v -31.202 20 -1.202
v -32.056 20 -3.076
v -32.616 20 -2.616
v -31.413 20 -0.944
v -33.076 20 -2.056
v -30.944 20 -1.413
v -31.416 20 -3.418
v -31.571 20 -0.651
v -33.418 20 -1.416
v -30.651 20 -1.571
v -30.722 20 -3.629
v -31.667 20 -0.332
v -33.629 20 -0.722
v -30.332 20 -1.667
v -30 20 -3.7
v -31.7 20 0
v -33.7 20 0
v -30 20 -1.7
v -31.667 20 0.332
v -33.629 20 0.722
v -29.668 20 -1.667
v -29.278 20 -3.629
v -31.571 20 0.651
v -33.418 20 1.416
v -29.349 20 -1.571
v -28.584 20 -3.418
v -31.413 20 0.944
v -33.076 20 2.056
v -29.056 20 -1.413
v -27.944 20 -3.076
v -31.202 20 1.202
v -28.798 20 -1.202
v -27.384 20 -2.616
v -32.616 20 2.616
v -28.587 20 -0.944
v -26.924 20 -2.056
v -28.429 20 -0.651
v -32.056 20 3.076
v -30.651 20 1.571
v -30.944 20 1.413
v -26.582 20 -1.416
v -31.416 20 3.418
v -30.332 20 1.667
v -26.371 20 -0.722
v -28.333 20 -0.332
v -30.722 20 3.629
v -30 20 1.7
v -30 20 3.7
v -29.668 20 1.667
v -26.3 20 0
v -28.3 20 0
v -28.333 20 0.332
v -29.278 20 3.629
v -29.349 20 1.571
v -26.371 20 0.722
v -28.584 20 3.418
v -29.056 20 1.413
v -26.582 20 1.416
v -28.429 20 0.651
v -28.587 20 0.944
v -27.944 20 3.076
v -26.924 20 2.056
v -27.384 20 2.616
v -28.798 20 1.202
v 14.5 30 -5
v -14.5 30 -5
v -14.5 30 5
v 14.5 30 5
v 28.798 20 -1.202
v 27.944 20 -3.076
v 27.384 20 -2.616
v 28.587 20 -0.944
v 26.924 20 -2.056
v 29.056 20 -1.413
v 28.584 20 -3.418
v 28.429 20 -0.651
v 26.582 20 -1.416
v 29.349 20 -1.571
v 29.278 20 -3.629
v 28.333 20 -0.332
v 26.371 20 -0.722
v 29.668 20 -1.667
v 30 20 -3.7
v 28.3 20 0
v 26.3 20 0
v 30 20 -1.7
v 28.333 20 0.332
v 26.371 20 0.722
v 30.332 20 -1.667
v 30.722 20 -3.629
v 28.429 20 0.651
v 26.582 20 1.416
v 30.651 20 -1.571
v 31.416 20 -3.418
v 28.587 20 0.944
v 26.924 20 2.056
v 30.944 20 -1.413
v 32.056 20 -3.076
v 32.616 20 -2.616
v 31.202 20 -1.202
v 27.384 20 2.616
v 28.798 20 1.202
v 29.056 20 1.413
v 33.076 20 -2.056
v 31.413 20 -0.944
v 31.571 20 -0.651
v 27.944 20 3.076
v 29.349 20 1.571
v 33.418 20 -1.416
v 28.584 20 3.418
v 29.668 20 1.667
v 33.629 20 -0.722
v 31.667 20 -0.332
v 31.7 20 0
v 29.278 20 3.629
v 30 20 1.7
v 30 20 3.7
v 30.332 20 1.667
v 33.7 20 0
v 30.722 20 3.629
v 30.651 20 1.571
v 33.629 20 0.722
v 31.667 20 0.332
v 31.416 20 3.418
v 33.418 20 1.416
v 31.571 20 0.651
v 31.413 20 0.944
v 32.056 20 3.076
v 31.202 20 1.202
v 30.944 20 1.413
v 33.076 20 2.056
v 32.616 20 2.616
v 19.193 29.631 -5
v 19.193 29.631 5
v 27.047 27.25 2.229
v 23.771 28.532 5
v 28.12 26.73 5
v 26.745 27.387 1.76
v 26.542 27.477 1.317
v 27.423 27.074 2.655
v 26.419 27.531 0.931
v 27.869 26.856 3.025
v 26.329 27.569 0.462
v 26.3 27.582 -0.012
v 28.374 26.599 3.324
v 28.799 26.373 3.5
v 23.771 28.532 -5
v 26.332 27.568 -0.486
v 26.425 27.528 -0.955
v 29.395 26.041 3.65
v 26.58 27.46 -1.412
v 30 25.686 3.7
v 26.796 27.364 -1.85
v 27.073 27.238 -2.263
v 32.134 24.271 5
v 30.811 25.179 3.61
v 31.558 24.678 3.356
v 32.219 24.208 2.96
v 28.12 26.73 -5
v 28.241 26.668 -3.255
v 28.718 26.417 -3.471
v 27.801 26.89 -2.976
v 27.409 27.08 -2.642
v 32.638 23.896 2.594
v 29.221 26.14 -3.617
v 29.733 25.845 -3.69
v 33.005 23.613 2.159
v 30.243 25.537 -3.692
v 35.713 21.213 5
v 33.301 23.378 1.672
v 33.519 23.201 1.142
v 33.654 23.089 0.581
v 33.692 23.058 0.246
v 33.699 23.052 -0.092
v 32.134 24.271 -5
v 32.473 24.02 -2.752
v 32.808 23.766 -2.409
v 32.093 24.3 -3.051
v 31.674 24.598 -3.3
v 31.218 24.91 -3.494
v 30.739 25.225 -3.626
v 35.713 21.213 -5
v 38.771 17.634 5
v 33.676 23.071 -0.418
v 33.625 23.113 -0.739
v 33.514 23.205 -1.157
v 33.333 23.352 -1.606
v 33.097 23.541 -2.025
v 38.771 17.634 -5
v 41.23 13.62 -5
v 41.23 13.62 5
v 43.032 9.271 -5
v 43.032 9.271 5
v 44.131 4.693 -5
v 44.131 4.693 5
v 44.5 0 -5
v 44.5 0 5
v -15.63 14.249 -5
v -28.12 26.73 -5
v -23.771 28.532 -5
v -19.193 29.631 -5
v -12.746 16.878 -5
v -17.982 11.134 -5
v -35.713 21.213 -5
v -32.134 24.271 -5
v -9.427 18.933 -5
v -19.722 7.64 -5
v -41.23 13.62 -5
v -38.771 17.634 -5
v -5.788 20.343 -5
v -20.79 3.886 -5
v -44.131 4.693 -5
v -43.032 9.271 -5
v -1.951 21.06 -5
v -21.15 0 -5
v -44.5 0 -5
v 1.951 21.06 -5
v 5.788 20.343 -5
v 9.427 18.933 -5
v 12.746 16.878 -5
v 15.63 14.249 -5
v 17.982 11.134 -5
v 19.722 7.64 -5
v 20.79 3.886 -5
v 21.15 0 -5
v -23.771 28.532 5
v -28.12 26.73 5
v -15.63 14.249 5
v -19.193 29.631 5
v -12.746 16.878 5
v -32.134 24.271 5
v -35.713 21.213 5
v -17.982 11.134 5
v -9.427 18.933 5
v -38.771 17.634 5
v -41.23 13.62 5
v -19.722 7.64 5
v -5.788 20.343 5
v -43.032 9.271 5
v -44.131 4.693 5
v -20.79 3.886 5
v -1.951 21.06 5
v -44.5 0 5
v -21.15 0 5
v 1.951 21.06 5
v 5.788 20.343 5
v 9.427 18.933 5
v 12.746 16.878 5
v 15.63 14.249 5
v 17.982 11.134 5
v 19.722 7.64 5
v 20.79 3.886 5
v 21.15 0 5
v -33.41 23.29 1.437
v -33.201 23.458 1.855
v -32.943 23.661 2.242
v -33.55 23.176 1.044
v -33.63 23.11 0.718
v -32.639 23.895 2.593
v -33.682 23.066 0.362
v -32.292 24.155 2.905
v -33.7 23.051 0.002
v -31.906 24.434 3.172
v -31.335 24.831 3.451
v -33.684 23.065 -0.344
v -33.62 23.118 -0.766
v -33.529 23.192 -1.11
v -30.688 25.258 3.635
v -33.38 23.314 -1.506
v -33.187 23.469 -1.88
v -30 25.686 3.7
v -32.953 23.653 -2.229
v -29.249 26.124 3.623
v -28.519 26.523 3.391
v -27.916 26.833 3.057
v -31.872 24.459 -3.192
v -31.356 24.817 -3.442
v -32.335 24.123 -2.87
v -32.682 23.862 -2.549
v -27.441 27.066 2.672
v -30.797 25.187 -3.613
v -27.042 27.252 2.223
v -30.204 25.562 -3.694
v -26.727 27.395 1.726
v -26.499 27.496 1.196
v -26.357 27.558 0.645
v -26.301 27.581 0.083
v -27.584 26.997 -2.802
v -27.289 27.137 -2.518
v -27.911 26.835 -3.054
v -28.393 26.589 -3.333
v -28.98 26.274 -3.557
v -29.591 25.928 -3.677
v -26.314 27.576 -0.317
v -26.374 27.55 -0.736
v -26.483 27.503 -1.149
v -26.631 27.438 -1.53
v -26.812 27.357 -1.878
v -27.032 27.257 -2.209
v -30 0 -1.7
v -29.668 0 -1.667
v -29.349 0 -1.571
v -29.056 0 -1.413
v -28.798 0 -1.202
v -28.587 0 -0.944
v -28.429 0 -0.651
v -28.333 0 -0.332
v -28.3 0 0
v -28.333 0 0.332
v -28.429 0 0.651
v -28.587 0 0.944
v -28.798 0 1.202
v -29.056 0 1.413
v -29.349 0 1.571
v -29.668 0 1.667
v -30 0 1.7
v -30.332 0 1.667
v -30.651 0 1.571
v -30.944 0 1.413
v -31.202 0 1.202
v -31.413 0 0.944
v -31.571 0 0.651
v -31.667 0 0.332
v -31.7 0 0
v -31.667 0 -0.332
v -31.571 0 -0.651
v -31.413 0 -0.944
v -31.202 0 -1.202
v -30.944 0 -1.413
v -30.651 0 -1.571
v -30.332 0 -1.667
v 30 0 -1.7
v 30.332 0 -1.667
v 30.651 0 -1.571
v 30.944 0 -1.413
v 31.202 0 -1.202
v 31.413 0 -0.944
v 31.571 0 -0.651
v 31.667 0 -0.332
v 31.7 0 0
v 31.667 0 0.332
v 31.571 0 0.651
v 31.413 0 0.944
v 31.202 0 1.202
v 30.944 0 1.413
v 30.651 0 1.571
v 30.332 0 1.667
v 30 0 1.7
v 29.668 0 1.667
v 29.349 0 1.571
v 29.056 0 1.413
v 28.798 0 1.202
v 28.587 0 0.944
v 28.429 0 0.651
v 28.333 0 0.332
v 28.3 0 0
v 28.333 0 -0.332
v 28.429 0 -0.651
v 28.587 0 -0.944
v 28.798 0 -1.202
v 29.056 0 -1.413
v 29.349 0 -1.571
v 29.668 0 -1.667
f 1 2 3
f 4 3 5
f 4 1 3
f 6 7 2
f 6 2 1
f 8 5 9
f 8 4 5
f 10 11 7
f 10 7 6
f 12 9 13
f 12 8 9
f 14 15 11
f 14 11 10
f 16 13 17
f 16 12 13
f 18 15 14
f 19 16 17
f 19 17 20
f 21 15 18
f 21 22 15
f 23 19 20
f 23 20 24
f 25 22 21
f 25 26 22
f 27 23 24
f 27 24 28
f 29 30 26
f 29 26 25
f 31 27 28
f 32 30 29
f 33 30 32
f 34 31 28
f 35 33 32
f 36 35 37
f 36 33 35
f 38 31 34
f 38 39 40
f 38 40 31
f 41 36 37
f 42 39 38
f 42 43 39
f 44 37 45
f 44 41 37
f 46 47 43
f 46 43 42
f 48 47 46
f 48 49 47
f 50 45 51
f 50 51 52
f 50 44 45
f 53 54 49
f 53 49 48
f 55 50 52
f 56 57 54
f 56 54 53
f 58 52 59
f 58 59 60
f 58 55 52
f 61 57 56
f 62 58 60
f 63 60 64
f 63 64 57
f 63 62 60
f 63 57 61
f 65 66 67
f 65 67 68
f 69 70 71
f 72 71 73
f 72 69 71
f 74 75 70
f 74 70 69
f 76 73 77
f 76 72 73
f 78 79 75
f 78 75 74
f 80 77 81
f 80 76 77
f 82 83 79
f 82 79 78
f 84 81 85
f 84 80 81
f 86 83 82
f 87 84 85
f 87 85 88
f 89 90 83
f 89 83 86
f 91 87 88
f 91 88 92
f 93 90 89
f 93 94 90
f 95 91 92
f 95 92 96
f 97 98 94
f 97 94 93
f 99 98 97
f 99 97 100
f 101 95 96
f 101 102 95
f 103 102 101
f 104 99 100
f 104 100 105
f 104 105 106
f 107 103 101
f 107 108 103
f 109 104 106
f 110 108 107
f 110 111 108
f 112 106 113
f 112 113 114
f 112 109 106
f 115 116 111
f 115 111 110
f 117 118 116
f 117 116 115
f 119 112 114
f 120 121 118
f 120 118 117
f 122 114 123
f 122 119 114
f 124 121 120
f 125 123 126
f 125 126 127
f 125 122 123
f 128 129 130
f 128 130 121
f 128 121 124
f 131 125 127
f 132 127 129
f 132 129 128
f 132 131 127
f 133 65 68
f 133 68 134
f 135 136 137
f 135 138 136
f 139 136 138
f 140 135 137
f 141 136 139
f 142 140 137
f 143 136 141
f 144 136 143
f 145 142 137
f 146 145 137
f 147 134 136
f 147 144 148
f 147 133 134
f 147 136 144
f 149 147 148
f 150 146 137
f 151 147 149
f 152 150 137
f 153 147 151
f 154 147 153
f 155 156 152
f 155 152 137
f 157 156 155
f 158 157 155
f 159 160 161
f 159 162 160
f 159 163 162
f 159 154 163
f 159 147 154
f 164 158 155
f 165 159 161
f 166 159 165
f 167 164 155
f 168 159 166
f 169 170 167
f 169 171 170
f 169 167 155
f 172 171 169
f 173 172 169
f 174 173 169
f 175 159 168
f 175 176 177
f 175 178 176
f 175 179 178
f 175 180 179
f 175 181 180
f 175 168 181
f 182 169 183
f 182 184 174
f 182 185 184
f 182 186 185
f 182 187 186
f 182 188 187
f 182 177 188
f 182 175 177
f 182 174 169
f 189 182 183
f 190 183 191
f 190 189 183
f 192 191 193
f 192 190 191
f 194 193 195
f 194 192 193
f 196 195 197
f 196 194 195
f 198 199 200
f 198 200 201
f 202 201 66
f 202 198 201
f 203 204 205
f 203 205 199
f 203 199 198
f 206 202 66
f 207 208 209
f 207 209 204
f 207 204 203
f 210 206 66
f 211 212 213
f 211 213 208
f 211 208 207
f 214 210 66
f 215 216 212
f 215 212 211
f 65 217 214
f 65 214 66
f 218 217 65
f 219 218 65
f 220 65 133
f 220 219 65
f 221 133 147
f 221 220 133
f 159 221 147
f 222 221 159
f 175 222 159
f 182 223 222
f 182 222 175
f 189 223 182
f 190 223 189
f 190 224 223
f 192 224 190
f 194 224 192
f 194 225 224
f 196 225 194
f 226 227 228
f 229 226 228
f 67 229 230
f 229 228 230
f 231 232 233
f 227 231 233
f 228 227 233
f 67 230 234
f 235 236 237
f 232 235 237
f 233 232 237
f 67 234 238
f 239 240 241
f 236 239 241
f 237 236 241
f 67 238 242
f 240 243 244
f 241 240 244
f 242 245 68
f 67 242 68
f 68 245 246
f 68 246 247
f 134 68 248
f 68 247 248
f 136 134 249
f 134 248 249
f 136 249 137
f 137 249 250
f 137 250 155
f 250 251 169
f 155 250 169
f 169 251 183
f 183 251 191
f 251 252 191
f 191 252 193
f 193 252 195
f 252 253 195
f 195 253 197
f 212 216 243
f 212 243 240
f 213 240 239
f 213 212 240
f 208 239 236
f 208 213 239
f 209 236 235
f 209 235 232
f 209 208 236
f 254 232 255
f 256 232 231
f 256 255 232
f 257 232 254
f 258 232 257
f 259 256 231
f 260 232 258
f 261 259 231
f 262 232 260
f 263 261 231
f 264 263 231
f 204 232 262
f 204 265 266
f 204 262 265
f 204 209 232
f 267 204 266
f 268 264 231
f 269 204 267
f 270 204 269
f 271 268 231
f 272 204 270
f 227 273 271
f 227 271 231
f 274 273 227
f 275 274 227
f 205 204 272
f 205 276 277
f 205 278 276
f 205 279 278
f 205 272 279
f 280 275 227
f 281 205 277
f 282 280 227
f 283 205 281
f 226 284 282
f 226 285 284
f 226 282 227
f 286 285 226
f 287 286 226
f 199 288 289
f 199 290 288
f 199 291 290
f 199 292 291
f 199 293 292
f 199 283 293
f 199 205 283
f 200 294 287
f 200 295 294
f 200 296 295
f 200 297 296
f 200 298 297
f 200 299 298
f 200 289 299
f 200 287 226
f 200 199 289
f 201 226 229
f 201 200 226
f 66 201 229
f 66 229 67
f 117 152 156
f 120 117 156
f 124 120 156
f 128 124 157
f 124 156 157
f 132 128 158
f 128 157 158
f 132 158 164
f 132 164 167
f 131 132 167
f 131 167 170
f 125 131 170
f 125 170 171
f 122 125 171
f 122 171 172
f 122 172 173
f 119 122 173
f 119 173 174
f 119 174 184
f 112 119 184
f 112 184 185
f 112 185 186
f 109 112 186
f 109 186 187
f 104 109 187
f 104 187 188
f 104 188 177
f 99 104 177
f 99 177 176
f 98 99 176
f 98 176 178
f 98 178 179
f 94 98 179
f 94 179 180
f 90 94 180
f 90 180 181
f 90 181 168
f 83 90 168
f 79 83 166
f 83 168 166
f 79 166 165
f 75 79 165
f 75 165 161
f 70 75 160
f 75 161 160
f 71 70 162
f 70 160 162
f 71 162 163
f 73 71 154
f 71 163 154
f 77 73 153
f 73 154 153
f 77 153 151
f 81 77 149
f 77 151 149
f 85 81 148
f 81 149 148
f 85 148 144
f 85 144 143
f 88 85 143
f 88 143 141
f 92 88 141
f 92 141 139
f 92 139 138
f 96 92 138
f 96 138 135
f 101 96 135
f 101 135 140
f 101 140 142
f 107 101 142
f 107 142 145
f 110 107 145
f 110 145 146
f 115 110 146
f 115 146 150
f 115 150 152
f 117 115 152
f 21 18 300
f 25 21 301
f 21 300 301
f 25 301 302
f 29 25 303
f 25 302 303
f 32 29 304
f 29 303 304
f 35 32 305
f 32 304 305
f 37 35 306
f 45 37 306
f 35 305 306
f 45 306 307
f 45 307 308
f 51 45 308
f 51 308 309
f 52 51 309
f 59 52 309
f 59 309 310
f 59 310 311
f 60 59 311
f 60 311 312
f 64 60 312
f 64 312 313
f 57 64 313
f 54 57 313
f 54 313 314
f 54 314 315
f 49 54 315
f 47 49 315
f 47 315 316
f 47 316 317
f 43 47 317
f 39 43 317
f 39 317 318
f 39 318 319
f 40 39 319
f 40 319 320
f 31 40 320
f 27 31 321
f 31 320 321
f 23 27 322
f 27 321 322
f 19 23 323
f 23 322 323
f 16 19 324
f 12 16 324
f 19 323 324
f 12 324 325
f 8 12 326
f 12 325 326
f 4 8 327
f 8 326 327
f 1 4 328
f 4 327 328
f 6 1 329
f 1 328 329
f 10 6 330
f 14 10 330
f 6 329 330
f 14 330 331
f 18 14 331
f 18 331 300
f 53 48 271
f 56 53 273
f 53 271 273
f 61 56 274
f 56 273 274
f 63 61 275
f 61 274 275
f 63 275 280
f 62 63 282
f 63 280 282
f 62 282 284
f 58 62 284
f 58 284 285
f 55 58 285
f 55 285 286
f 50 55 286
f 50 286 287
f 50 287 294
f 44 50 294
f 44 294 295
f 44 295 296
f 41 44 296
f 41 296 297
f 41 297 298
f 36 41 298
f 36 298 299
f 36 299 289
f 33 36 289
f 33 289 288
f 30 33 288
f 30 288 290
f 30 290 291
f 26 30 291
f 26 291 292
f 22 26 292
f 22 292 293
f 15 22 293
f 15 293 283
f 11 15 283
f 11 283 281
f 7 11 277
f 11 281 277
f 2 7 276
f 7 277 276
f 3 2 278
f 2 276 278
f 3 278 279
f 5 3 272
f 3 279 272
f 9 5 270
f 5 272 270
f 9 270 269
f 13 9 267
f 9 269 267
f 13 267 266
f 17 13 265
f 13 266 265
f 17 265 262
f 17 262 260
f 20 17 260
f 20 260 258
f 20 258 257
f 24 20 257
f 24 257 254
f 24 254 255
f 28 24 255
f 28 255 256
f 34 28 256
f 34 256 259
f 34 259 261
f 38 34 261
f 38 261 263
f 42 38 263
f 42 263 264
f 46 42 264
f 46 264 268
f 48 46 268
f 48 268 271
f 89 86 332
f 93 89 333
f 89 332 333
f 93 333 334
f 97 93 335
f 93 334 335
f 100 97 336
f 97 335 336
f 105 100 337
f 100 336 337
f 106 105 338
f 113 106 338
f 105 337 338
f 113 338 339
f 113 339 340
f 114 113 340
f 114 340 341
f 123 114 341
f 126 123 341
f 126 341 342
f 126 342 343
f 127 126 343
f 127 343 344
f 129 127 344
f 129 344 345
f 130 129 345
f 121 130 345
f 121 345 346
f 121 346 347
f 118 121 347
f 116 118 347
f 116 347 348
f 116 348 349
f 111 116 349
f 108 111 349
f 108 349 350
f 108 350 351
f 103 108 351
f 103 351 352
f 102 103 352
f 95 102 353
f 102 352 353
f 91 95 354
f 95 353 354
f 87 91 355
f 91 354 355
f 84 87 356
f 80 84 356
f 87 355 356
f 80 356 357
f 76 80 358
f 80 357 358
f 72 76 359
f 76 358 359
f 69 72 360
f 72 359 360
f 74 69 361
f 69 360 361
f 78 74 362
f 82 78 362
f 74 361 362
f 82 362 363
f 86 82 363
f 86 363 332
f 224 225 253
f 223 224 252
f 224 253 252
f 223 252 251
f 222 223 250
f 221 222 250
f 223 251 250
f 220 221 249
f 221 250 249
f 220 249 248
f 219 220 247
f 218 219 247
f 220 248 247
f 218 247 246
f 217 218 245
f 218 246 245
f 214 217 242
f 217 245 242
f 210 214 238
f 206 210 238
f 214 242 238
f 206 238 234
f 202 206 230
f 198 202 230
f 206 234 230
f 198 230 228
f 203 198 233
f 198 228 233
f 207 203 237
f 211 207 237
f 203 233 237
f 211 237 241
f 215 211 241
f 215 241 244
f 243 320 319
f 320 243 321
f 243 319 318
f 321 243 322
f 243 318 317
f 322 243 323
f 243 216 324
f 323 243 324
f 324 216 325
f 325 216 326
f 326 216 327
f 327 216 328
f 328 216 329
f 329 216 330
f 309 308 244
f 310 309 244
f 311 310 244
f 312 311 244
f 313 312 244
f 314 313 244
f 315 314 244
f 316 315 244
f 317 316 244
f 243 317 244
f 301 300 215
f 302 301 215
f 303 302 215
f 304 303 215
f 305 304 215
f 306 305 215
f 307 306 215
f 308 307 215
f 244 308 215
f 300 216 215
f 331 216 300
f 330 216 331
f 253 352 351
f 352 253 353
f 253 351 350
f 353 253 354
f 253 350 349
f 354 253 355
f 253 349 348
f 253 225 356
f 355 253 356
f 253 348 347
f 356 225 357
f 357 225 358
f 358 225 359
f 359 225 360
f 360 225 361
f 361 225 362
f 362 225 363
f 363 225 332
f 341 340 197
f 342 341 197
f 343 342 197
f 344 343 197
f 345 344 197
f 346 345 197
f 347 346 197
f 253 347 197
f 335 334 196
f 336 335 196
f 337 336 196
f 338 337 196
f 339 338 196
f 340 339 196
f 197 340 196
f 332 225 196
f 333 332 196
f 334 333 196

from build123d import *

# Parameters (mm, degrees)
SKETCH_1_W          = 89
SKETCH_1_H          = 10
EXTRUDE_1_DEPTH     = 30
SKETCH_2_R          = 21.15
CUT_EXTRUDE_1_DEPTH = 20
SKETCH_3_R          = 1.7
CUT_EXTRUDE_2_DEPTH = 60
SKETCH_4_R          = 3.7
CUT_EXTRUDE_3_DEPTH = 10
FILLET_START        = -5
FILLET_1_DEPTH      = 10


with BuildPart() as part:
    # 草图1 → 凸台-拉伸1 (new body)
    with BuildSketch(Plane(origin=(0, 0, 0), x_dir=(1, 0, 0), z_dir=(0, 1, 0))):
        Rectangle(SKETCH_1_W, SKETCH_1_H)
    extrude(amount=EXTRUDE_1_DEPTH)

    # 草图2 → 切除-拉伸1 (cut)
    with BuildSketch(Plane.XY.offset(5)):
        Circle(SKETCH_2_R)
    extrude(amount=-CUT_EXTRUDE_1_DEPTH, mode=Mode.SUBTRACT)

    # 草图3 → 切除-拉伸2 (cut)
    with BuildSketch(Plane.XZ):
        with Locations(Location((-30, 0, 0), (0, 0, 270))):
            Circle(SKETCH_3_R)
        with Locations(Location((30, 0, 0), (0, 0, 270))):
            Circle(SKETCH_3_R)
    extrude(amount=-CUT_EXTRUDE_2_DEPTH, mode=Mode.SUBTRACT)

    # 草图4 → 切除-拉伸3 (cut)
    with BuildSketch(Plane(origin=(0, 30, 0), x_dir=(1, 0, 0), z_dir=(0, 1, 0))):
        with Locations(Location((-30, 0, 0), (0, 0, 270))):
            Circle(SKETCH_4_R)
        with Locations(Location((30, 0, 0), (0, 0, 270))):
            Circle(SKETCH_4_R)
    extrude(amount=-CUT_EXTRUDE_3_DEPTH, mode=Mode.SUBTRACT)

    # 圆角1: read off the stored shape, not the designer's step
    # 圆角1 outline → 圆角1 (cut)
    with BuildSketch(Plane.XY.offset(FILLET_START)):
        with BuildLine():
            ThreePointArc((-44.5, 0), (-35.713203436, 21.213203436), (-14.5, 30))
            Line((-14.5, 30), (-44.5, 30))
            Line((-44.5, 30), (-44.5, 0))
        make_face()
        with BuildLine():
            ThreePointArc((14.5, 30), (35.713203436, 21.213203436), (44.5, 0))
            Line((44.5, 0), (44.5, 30))
            Line((44.5, 30), (14.5, 30))
        make_face()
    extrude(amount=FILLET_1_DEPTH, mode=Mode.SUBTRACT)


solid = part.part
